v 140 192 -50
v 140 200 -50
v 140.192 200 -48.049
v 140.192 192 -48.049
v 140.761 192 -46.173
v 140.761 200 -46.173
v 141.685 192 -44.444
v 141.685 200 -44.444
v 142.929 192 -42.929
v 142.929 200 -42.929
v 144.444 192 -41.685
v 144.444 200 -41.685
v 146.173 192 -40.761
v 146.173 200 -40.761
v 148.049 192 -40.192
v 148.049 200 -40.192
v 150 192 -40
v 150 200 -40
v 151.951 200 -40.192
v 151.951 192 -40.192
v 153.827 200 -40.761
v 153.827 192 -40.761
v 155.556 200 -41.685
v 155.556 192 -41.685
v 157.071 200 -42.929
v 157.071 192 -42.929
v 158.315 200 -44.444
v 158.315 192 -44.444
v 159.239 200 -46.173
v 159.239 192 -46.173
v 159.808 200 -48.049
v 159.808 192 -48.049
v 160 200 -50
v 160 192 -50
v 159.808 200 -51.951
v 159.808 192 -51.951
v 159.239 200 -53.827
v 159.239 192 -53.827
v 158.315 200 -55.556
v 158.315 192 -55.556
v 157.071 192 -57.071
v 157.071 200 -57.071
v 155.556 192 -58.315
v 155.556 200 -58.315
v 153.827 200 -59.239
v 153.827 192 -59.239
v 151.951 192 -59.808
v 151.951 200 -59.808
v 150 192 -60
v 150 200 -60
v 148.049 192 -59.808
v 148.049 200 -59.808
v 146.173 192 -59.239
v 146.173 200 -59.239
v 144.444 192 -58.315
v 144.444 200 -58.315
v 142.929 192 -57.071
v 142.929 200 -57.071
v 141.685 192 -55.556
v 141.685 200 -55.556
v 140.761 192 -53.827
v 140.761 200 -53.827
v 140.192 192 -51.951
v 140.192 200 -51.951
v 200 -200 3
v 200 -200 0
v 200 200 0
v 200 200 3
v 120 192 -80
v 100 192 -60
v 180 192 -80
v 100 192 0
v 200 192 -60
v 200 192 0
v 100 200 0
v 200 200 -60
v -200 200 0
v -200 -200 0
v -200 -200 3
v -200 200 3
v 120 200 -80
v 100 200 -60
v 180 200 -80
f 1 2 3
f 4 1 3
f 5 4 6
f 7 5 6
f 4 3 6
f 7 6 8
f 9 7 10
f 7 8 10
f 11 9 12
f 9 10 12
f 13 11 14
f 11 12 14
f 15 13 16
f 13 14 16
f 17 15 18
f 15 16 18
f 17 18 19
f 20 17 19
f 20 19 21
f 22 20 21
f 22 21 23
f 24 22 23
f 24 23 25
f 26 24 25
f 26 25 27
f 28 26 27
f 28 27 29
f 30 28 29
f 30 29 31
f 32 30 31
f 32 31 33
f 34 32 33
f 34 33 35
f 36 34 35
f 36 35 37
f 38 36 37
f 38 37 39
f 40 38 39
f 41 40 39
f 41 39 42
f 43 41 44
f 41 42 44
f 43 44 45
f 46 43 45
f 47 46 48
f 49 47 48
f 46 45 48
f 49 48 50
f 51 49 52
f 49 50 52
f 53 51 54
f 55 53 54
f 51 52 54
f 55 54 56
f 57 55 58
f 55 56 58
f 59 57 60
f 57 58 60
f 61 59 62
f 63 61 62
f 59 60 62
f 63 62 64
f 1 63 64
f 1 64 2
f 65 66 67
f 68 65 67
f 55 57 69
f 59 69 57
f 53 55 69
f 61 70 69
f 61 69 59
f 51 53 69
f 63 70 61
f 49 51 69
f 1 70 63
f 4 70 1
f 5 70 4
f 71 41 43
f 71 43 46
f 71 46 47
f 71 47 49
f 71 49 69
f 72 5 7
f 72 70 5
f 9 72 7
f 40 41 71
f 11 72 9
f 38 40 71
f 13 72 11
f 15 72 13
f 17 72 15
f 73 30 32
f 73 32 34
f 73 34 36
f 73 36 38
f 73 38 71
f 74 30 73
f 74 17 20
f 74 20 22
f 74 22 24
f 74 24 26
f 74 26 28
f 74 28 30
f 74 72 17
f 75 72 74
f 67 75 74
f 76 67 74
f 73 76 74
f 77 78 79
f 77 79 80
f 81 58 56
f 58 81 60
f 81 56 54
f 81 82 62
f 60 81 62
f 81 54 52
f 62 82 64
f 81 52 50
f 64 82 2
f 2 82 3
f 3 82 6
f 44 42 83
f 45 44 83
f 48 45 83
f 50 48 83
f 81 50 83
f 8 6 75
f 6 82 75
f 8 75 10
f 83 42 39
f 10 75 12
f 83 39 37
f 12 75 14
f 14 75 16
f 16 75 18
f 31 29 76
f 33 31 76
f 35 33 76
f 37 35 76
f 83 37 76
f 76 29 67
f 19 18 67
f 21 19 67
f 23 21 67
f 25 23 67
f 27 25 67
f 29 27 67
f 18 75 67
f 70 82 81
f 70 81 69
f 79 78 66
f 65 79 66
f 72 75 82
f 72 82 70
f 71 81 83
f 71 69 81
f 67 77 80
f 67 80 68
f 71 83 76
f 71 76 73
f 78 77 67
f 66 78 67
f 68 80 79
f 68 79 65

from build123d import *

# Parameters (mm, degrees)
F0_W     = 400
F0_H     = 400
F1_DEPTH = 3
F2_W     = 100
F2_H     = 8
F3_DEPTH = 80
F4_SIZE  = 20
F5_R     = 10
F6_DEPTH = 25
F7_SIZE  = 20


with BuildPart() as f1:
    # F0 (on Top) → F1 (new body)
    with BuildSketch(Plane.XY):
        Rectangle(F0_W, F0_H)
    extrude(amount=F1_DEPTH)


with BuildPart() as f3:
    # F2 (on face) → F3 (new body)
    with BuildSketch(Plane(origin=(0, 0, 0), x_dir=(1, 0, 0), z_dir=(0, 0, -1))):
        with Locations((150, -196)):
            Rectangle(F2_W, F2_H)
    extrude(amount=F3_DEPTH)

    # F4
    f4_edges = [f3.edges().sort_by_distance(p)[0] for p in [
        (200, 196, -80),
    ]]
    chamfer(f4_edges, length=F4_SIZE)

    # F5 (on face) → F6 (cut)
    with BuildSketch(Plane(origin=(0, 200, 0), x_dir=(-1, 0, 0), z_dir=(0, 1, 0))):
        with Locations((-150, -50)):
            Circle(F5_R)
    extrude(amount=-F6_DEPTH, mode=Mode.SUBTRACT)

    # F7
    f7_edges = [f3.edges().sort_by_distance(p)[0] for p in [
        (100, 196, -80),
    ]]
    chamfer(f7_edges, length=F7_SIZE)


solid = Compound([f1.part, f3.part])
